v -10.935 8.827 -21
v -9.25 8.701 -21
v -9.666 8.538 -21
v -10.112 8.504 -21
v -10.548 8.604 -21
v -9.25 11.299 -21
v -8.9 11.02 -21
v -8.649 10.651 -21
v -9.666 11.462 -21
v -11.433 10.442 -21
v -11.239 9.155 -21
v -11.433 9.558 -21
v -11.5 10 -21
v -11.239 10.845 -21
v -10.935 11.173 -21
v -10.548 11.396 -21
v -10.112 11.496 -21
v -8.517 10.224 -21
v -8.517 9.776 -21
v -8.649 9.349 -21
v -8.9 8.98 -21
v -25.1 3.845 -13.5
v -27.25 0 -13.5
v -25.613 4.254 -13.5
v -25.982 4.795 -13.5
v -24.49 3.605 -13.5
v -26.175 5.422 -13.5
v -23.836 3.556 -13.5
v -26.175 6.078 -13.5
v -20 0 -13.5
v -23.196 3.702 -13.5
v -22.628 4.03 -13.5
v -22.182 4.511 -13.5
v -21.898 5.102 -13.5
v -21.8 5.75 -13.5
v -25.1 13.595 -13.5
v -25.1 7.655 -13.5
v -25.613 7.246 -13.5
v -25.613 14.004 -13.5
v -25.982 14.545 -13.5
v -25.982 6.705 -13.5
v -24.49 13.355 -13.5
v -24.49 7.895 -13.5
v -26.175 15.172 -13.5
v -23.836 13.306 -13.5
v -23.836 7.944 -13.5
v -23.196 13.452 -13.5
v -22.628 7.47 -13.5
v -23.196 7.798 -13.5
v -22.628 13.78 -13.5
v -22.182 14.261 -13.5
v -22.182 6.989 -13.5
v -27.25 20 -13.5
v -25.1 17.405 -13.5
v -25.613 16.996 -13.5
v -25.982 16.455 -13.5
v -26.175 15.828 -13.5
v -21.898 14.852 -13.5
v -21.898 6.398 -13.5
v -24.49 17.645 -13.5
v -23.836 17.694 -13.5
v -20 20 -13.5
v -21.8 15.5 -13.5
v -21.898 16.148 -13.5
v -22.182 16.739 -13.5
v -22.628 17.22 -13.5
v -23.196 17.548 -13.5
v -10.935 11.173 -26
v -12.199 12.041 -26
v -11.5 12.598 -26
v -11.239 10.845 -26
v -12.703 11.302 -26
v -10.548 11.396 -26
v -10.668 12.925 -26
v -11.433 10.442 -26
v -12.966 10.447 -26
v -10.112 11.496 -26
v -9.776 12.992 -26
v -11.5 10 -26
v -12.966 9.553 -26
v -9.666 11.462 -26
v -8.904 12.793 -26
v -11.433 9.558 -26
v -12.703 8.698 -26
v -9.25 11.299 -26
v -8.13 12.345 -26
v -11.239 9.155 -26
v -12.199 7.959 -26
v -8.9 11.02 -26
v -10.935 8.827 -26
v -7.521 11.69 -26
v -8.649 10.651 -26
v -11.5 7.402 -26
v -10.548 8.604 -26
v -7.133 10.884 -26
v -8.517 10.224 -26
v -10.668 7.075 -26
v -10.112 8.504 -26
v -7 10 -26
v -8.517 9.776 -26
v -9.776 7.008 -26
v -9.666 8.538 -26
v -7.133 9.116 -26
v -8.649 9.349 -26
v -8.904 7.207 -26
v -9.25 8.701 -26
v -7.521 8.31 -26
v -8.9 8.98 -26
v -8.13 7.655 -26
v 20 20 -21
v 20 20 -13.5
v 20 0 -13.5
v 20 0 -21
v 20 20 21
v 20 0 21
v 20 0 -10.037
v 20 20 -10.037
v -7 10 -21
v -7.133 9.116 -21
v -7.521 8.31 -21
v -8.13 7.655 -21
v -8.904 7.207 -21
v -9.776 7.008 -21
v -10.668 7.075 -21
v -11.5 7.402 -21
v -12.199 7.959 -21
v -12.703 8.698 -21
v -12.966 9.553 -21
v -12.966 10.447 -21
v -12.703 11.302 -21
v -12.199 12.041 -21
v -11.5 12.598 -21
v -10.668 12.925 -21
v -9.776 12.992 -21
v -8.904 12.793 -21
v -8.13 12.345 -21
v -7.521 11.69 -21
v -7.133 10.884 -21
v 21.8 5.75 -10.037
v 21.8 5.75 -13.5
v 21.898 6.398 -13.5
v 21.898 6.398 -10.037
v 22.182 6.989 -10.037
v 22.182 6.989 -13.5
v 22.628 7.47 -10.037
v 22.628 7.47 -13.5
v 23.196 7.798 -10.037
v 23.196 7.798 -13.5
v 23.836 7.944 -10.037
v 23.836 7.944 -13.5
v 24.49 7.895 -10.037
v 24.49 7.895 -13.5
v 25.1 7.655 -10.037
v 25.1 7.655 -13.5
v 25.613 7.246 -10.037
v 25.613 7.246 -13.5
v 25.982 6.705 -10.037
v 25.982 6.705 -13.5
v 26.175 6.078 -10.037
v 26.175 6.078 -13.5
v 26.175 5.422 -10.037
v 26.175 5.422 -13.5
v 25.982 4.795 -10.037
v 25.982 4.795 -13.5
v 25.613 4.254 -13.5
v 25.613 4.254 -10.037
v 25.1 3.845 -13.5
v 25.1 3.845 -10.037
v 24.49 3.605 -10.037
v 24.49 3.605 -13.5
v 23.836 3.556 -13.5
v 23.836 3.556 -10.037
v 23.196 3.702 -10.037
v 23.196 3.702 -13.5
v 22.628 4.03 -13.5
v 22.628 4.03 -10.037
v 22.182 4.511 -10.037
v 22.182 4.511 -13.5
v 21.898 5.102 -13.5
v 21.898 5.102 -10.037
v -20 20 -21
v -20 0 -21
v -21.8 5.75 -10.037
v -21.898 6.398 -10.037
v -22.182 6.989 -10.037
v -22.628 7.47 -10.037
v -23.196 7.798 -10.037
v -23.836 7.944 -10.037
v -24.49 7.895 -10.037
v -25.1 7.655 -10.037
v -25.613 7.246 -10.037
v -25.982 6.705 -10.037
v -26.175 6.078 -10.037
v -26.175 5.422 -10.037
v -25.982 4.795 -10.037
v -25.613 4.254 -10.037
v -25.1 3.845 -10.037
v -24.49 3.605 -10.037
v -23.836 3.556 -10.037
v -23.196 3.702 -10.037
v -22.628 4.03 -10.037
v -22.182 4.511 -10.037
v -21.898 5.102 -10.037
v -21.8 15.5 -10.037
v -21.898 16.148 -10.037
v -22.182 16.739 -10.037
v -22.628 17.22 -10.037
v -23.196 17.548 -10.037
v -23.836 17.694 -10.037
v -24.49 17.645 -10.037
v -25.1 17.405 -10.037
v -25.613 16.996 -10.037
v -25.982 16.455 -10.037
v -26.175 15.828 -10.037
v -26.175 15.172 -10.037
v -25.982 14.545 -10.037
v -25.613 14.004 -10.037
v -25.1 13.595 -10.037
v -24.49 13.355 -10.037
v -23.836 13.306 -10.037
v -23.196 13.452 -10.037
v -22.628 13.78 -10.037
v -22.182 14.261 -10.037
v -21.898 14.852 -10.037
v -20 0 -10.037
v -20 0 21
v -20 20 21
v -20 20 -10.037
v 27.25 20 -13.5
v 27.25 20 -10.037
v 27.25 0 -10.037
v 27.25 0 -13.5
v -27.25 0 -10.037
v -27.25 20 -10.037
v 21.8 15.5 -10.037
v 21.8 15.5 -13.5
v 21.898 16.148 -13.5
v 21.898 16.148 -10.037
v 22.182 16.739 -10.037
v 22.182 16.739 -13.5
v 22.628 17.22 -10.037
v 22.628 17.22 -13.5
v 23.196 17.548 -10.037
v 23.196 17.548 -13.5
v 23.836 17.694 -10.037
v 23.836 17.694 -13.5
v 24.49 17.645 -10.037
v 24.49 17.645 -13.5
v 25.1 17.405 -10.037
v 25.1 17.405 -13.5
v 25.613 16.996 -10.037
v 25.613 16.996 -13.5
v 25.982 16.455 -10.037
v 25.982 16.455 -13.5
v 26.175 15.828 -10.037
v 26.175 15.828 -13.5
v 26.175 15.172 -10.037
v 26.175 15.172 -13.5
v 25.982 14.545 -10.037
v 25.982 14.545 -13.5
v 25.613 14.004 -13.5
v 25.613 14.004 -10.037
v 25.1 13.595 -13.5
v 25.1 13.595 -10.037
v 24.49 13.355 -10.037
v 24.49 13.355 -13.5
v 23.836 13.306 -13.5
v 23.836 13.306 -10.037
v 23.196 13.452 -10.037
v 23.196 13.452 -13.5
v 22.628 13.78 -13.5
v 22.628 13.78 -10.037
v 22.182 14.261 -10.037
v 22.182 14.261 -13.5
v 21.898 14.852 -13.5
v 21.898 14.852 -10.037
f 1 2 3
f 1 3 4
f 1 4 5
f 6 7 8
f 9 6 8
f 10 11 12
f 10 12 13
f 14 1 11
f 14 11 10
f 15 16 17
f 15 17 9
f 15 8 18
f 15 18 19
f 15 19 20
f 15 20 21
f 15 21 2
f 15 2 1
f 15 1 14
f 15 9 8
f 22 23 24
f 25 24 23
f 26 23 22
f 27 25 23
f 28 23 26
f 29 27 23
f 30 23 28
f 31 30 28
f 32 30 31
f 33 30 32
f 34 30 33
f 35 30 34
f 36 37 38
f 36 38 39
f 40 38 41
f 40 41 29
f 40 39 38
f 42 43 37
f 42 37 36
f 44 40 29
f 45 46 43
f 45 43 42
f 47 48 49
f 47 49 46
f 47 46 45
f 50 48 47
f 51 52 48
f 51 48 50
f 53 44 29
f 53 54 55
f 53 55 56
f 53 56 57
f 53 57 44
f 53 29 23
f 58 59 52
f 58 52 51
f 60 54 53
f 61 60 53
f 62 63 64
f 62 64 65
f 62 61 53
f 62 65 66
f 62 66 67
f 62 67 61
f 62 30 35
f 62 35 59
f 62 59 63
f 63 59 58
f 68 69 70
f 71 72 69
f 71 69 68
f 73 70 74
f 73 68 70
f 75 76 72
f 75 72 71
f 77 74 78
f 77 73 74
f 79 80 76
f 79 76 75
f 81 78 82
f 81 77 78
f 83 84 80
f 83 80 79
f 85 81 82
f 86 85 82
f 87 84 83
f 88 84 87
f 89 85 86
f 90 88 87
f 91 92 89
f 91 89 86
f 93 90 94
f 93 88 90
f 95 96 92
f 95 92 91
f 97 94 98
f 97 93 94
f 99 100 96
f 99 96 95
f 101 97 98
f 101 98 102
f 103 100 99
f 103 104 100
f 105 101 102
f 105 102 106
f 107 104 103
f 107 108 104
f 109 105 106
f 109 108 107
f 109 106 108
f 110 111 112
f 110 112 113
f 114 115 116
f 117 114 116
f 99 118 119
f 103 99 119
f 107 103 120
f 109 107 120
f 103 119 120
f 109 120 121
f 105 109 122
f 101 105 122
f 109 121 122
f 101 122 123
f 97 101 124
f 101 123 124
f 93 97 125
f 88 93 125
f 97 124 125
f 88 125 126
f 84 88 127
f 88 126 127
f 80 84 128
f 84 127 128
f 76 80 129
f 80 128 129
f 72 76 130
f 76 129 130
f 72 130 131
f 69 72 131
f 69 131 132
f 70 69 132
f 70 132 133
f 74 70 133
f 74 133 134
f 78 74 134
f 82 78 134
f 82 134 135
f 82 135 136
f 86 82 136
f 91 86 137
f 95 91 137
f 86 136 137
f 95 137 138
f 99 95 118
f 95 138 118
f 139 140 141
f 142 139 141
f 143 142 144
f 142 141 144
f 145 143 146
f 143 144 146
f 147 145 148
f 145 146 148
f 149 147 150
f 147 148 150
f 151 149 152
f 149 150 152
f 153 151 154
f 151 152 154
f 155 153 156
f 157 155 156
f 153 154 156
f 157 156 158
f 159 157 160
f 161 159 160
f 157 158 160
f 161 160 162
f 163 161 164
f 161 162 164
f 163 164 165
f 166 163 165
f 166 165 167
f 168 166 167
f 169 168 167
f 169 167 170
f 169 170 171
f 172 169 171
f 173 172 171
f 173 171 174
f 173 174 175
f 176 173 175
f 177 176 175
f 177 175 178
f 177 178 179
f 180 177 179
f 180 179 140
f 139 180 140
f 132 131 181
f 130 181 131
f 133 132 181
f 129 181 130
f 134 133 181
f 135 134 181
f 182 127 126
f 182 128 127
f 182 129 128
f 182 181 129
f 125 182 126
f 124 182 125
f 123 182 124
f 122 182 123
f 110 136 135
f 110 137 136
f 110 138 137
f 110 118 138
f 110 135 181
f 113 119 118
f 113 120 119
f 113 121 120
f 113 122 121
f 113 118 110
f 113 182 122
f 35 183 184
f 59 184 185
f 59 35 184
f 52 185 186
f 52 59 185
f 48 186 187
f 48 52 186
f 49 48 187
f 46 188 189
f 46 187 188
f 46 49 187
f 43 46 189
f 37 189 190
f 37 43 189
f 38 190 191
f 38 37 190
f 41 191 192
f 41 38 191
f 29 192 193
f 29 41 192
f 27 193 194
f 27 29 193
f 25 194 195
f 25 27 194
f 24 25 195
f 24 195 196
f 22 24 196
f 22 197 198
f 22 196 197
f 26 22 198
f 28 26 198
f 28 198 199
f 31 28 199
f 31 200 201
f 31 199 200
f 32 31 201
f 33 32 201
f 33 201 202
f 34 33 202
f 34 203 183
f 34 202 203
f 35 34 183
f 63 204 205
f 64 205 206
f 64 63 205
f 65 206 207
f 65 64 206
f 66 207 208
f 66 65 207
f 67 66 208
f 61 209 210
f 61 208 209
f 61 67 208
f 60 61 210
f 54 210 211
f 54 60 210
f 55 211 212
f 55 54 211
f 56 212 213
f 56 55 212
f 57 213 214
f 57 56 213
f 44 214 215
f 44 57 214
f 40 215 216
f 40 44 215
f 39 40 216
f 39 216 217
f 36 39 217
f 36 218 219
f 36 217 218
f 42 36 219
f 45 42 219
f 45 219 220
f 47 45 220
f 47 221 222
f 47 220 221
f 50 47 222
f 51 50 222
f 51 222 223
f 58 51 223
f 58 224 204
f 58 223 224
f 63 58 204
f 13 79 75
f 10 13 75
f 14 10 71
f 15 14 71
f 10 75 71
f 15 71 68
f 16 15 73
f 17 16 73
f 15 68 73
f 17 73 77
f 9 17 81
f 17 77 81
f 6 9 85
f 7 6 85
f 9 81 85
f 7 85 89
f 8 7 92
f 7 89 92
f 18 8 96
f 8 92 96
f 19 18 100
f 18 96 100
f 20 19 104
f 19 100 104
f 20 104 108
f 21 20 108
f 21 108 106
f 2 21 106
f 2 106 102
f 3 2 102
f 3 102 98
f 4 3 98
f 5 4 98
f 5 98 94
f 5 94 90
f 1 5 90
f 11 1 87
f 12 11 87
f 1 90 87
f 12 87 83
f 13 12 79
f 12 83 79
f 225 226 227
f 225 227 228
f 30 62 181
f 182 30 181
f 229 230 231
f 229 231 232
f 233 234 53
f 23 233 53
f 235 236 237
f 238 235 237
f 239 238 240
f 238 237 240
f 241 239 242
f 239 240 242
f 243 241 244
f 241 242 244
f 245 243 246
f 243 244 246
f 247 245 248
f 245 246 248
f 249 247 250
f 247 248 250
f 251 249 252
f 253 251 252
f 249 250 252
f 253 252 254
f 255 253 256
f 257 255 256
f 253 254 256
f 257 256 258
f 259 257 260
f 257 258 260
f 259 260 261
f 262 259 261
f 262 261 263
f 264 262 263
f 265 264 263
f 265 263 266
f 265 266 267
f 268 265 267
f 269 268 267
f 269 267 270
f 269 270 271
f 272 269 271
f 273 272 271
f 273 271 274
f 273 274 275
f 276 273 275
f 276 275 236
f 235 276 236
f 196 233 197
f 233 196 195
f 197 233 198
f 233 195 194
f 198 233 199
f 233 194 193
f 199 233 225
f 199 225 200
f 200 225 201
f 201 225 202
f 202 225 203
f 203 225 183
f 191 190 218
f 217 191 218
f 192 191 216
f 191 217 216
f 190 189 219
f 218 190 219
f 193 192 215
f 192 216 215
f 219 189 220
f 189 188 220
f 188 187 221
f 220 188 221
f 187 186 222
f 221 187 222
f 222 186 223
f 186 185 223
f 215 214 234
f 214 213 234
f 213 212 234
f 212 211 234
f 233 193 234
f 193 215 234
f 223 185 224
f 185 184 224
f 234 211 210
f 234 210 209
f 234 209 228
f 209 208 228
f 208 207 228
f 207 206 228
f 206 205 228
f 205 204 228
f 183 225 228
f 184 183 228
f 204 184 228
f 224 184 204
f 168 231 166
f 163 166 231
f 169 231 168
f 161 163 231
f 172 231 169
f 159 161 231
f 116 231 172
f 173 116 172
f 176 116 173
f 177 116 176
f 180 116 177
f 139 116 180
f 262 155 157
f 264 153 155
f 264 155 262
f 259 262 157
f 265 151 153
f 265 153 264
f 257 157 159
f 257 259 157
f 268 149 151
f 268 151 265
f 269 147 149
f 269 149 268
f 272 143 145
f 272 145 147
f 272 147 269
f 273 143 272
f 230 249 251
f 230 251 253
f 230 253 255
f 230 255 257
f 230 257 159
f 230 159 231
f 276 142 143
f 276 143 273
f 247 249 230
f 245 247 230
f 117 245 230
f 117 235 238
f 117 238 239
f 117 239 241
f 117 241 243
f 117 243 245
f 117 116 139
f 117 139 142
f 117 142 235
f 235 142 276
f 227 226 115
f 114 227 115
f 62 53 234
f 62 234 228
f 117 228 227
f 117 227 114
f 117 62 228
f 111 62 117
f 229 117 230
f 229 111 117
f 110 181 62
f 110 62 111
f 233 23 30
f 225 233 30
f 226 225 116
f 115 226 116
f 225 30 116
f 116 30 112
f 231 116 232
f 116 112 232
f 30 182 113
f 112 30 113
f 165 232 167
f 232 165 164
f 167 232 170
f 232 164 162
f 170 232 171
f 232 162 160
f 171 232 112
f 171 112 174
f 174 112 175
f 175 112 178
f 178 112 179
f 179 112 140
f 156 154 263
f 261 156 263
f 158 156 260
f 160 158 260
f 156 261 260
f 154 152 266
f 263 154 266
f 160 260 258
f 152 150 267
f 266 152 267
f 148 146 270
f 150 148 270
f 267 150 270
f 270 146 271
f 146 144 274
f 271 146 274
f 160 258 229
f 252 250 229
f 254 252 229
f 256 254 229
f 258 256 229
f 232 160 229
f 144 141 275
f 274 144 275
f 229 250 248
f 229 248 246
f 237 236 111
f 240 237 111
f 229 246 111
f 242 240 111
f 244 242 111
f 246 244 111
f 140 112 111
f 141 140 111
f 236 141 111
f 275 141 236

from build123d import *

# Parameters (mm, degrees)
SKETCH_1_W          = 40
SKETCH_1_H          = 42
EXTRUDE_1_DEPTH     = 20
SKETCH_2_W          = 3.463290034
SKETCH_2_H          = 20
EXTRUDE_2_DEPTH     = 7.25
SKETCH_3_R          = 2.2
CUT_EXTRUDE_1_DEPTH = 7.25
SKETCH_4_R          = 3
EXTRUDE_3_DEPTH     = 5
SKETCH_5_R          = 1.5
CUT_EXTRUDE_2_DEPTH = 5


with BuildPart() as part:
    # Эскиз1 → Бобышка-Вытянуть1 (new body)
    with BuildSketch(Plane(origin=(0, 0, 0), x_dir=(1, 0, 0), z_dir=(0, 1, 0))):
        Rectangle(SKETCH_1_W, SKETCH_1_H)
    extrude(amount=EXTRUDE_1_DEPTH)

    # Эскиз2 → Бобышка-Вытянуть2 (add)
    with BuildSketch(Plane(origin=(20, 0, 0), x_dir=(0, 0, -1), z_dir=(1, 0, 0))):
        with Locations((11.768354983, 10)):
            Rectangle(SKETCH_2_W, SKETCH_2_H)
    extrude_2 = extrude(amount=EXTRUDE_2_DEPTH)

    # Эскиз3 → Вырез-Вытянуть1 (cut)
    with BuildSketch(Plane(origin=(0, 0, -13.5), x_dir=(-1, 0, 0), z_dir=(0, 0, -1))):
        with Locations((-24, 15.5)):
            Circle(SKETCH_3_R)
        with Locations((-24, 5.75)):
            Circle(SKETCH_3_R)
    cut_extrude_1 = extrude(amount=-CUT_EXTRUDE_1_DEPTH, mode=Mode.SUBTRACT)

    # Зеркальное отражение2: Бобышка-Вытянуть2, Вырез-Вытянуть1 across plane
    add(extrude_2.mirror(Plane.ZY))
    add(cut_extrude_1.mirror(Plane.ZY), mode=Mode.SUBTRACT)

    # Эскиз4 → Бобышка-Вытянуть3 (add)
    with BuildSketch(Plane(origin=(0, 0, -21), x_dir=(-1, 0, 0), z_dir=(0, 0, -1))):
        with Locations(Location((10, 10, 0), (0, 0, 180))):
            Circle(SKETCH_4_R)
    extrude(amount=EXTRUDE_3_DEPTH)

    # Эскиз5 → Вырез-Вытянуть2 (cut)
    with BuildSketch(Plane(origin=(0, 0, -26), x_dir=(-1, 0, 0), z_dir=(0, 0, -1))):
        with Locations((10, 10)):
            Circle(SKETCH_5_R)
    extrude(amount=-CUT_EXTRUDE_2_DEPTH, mode=Mode.SUBTRACT)


solid = part.part
